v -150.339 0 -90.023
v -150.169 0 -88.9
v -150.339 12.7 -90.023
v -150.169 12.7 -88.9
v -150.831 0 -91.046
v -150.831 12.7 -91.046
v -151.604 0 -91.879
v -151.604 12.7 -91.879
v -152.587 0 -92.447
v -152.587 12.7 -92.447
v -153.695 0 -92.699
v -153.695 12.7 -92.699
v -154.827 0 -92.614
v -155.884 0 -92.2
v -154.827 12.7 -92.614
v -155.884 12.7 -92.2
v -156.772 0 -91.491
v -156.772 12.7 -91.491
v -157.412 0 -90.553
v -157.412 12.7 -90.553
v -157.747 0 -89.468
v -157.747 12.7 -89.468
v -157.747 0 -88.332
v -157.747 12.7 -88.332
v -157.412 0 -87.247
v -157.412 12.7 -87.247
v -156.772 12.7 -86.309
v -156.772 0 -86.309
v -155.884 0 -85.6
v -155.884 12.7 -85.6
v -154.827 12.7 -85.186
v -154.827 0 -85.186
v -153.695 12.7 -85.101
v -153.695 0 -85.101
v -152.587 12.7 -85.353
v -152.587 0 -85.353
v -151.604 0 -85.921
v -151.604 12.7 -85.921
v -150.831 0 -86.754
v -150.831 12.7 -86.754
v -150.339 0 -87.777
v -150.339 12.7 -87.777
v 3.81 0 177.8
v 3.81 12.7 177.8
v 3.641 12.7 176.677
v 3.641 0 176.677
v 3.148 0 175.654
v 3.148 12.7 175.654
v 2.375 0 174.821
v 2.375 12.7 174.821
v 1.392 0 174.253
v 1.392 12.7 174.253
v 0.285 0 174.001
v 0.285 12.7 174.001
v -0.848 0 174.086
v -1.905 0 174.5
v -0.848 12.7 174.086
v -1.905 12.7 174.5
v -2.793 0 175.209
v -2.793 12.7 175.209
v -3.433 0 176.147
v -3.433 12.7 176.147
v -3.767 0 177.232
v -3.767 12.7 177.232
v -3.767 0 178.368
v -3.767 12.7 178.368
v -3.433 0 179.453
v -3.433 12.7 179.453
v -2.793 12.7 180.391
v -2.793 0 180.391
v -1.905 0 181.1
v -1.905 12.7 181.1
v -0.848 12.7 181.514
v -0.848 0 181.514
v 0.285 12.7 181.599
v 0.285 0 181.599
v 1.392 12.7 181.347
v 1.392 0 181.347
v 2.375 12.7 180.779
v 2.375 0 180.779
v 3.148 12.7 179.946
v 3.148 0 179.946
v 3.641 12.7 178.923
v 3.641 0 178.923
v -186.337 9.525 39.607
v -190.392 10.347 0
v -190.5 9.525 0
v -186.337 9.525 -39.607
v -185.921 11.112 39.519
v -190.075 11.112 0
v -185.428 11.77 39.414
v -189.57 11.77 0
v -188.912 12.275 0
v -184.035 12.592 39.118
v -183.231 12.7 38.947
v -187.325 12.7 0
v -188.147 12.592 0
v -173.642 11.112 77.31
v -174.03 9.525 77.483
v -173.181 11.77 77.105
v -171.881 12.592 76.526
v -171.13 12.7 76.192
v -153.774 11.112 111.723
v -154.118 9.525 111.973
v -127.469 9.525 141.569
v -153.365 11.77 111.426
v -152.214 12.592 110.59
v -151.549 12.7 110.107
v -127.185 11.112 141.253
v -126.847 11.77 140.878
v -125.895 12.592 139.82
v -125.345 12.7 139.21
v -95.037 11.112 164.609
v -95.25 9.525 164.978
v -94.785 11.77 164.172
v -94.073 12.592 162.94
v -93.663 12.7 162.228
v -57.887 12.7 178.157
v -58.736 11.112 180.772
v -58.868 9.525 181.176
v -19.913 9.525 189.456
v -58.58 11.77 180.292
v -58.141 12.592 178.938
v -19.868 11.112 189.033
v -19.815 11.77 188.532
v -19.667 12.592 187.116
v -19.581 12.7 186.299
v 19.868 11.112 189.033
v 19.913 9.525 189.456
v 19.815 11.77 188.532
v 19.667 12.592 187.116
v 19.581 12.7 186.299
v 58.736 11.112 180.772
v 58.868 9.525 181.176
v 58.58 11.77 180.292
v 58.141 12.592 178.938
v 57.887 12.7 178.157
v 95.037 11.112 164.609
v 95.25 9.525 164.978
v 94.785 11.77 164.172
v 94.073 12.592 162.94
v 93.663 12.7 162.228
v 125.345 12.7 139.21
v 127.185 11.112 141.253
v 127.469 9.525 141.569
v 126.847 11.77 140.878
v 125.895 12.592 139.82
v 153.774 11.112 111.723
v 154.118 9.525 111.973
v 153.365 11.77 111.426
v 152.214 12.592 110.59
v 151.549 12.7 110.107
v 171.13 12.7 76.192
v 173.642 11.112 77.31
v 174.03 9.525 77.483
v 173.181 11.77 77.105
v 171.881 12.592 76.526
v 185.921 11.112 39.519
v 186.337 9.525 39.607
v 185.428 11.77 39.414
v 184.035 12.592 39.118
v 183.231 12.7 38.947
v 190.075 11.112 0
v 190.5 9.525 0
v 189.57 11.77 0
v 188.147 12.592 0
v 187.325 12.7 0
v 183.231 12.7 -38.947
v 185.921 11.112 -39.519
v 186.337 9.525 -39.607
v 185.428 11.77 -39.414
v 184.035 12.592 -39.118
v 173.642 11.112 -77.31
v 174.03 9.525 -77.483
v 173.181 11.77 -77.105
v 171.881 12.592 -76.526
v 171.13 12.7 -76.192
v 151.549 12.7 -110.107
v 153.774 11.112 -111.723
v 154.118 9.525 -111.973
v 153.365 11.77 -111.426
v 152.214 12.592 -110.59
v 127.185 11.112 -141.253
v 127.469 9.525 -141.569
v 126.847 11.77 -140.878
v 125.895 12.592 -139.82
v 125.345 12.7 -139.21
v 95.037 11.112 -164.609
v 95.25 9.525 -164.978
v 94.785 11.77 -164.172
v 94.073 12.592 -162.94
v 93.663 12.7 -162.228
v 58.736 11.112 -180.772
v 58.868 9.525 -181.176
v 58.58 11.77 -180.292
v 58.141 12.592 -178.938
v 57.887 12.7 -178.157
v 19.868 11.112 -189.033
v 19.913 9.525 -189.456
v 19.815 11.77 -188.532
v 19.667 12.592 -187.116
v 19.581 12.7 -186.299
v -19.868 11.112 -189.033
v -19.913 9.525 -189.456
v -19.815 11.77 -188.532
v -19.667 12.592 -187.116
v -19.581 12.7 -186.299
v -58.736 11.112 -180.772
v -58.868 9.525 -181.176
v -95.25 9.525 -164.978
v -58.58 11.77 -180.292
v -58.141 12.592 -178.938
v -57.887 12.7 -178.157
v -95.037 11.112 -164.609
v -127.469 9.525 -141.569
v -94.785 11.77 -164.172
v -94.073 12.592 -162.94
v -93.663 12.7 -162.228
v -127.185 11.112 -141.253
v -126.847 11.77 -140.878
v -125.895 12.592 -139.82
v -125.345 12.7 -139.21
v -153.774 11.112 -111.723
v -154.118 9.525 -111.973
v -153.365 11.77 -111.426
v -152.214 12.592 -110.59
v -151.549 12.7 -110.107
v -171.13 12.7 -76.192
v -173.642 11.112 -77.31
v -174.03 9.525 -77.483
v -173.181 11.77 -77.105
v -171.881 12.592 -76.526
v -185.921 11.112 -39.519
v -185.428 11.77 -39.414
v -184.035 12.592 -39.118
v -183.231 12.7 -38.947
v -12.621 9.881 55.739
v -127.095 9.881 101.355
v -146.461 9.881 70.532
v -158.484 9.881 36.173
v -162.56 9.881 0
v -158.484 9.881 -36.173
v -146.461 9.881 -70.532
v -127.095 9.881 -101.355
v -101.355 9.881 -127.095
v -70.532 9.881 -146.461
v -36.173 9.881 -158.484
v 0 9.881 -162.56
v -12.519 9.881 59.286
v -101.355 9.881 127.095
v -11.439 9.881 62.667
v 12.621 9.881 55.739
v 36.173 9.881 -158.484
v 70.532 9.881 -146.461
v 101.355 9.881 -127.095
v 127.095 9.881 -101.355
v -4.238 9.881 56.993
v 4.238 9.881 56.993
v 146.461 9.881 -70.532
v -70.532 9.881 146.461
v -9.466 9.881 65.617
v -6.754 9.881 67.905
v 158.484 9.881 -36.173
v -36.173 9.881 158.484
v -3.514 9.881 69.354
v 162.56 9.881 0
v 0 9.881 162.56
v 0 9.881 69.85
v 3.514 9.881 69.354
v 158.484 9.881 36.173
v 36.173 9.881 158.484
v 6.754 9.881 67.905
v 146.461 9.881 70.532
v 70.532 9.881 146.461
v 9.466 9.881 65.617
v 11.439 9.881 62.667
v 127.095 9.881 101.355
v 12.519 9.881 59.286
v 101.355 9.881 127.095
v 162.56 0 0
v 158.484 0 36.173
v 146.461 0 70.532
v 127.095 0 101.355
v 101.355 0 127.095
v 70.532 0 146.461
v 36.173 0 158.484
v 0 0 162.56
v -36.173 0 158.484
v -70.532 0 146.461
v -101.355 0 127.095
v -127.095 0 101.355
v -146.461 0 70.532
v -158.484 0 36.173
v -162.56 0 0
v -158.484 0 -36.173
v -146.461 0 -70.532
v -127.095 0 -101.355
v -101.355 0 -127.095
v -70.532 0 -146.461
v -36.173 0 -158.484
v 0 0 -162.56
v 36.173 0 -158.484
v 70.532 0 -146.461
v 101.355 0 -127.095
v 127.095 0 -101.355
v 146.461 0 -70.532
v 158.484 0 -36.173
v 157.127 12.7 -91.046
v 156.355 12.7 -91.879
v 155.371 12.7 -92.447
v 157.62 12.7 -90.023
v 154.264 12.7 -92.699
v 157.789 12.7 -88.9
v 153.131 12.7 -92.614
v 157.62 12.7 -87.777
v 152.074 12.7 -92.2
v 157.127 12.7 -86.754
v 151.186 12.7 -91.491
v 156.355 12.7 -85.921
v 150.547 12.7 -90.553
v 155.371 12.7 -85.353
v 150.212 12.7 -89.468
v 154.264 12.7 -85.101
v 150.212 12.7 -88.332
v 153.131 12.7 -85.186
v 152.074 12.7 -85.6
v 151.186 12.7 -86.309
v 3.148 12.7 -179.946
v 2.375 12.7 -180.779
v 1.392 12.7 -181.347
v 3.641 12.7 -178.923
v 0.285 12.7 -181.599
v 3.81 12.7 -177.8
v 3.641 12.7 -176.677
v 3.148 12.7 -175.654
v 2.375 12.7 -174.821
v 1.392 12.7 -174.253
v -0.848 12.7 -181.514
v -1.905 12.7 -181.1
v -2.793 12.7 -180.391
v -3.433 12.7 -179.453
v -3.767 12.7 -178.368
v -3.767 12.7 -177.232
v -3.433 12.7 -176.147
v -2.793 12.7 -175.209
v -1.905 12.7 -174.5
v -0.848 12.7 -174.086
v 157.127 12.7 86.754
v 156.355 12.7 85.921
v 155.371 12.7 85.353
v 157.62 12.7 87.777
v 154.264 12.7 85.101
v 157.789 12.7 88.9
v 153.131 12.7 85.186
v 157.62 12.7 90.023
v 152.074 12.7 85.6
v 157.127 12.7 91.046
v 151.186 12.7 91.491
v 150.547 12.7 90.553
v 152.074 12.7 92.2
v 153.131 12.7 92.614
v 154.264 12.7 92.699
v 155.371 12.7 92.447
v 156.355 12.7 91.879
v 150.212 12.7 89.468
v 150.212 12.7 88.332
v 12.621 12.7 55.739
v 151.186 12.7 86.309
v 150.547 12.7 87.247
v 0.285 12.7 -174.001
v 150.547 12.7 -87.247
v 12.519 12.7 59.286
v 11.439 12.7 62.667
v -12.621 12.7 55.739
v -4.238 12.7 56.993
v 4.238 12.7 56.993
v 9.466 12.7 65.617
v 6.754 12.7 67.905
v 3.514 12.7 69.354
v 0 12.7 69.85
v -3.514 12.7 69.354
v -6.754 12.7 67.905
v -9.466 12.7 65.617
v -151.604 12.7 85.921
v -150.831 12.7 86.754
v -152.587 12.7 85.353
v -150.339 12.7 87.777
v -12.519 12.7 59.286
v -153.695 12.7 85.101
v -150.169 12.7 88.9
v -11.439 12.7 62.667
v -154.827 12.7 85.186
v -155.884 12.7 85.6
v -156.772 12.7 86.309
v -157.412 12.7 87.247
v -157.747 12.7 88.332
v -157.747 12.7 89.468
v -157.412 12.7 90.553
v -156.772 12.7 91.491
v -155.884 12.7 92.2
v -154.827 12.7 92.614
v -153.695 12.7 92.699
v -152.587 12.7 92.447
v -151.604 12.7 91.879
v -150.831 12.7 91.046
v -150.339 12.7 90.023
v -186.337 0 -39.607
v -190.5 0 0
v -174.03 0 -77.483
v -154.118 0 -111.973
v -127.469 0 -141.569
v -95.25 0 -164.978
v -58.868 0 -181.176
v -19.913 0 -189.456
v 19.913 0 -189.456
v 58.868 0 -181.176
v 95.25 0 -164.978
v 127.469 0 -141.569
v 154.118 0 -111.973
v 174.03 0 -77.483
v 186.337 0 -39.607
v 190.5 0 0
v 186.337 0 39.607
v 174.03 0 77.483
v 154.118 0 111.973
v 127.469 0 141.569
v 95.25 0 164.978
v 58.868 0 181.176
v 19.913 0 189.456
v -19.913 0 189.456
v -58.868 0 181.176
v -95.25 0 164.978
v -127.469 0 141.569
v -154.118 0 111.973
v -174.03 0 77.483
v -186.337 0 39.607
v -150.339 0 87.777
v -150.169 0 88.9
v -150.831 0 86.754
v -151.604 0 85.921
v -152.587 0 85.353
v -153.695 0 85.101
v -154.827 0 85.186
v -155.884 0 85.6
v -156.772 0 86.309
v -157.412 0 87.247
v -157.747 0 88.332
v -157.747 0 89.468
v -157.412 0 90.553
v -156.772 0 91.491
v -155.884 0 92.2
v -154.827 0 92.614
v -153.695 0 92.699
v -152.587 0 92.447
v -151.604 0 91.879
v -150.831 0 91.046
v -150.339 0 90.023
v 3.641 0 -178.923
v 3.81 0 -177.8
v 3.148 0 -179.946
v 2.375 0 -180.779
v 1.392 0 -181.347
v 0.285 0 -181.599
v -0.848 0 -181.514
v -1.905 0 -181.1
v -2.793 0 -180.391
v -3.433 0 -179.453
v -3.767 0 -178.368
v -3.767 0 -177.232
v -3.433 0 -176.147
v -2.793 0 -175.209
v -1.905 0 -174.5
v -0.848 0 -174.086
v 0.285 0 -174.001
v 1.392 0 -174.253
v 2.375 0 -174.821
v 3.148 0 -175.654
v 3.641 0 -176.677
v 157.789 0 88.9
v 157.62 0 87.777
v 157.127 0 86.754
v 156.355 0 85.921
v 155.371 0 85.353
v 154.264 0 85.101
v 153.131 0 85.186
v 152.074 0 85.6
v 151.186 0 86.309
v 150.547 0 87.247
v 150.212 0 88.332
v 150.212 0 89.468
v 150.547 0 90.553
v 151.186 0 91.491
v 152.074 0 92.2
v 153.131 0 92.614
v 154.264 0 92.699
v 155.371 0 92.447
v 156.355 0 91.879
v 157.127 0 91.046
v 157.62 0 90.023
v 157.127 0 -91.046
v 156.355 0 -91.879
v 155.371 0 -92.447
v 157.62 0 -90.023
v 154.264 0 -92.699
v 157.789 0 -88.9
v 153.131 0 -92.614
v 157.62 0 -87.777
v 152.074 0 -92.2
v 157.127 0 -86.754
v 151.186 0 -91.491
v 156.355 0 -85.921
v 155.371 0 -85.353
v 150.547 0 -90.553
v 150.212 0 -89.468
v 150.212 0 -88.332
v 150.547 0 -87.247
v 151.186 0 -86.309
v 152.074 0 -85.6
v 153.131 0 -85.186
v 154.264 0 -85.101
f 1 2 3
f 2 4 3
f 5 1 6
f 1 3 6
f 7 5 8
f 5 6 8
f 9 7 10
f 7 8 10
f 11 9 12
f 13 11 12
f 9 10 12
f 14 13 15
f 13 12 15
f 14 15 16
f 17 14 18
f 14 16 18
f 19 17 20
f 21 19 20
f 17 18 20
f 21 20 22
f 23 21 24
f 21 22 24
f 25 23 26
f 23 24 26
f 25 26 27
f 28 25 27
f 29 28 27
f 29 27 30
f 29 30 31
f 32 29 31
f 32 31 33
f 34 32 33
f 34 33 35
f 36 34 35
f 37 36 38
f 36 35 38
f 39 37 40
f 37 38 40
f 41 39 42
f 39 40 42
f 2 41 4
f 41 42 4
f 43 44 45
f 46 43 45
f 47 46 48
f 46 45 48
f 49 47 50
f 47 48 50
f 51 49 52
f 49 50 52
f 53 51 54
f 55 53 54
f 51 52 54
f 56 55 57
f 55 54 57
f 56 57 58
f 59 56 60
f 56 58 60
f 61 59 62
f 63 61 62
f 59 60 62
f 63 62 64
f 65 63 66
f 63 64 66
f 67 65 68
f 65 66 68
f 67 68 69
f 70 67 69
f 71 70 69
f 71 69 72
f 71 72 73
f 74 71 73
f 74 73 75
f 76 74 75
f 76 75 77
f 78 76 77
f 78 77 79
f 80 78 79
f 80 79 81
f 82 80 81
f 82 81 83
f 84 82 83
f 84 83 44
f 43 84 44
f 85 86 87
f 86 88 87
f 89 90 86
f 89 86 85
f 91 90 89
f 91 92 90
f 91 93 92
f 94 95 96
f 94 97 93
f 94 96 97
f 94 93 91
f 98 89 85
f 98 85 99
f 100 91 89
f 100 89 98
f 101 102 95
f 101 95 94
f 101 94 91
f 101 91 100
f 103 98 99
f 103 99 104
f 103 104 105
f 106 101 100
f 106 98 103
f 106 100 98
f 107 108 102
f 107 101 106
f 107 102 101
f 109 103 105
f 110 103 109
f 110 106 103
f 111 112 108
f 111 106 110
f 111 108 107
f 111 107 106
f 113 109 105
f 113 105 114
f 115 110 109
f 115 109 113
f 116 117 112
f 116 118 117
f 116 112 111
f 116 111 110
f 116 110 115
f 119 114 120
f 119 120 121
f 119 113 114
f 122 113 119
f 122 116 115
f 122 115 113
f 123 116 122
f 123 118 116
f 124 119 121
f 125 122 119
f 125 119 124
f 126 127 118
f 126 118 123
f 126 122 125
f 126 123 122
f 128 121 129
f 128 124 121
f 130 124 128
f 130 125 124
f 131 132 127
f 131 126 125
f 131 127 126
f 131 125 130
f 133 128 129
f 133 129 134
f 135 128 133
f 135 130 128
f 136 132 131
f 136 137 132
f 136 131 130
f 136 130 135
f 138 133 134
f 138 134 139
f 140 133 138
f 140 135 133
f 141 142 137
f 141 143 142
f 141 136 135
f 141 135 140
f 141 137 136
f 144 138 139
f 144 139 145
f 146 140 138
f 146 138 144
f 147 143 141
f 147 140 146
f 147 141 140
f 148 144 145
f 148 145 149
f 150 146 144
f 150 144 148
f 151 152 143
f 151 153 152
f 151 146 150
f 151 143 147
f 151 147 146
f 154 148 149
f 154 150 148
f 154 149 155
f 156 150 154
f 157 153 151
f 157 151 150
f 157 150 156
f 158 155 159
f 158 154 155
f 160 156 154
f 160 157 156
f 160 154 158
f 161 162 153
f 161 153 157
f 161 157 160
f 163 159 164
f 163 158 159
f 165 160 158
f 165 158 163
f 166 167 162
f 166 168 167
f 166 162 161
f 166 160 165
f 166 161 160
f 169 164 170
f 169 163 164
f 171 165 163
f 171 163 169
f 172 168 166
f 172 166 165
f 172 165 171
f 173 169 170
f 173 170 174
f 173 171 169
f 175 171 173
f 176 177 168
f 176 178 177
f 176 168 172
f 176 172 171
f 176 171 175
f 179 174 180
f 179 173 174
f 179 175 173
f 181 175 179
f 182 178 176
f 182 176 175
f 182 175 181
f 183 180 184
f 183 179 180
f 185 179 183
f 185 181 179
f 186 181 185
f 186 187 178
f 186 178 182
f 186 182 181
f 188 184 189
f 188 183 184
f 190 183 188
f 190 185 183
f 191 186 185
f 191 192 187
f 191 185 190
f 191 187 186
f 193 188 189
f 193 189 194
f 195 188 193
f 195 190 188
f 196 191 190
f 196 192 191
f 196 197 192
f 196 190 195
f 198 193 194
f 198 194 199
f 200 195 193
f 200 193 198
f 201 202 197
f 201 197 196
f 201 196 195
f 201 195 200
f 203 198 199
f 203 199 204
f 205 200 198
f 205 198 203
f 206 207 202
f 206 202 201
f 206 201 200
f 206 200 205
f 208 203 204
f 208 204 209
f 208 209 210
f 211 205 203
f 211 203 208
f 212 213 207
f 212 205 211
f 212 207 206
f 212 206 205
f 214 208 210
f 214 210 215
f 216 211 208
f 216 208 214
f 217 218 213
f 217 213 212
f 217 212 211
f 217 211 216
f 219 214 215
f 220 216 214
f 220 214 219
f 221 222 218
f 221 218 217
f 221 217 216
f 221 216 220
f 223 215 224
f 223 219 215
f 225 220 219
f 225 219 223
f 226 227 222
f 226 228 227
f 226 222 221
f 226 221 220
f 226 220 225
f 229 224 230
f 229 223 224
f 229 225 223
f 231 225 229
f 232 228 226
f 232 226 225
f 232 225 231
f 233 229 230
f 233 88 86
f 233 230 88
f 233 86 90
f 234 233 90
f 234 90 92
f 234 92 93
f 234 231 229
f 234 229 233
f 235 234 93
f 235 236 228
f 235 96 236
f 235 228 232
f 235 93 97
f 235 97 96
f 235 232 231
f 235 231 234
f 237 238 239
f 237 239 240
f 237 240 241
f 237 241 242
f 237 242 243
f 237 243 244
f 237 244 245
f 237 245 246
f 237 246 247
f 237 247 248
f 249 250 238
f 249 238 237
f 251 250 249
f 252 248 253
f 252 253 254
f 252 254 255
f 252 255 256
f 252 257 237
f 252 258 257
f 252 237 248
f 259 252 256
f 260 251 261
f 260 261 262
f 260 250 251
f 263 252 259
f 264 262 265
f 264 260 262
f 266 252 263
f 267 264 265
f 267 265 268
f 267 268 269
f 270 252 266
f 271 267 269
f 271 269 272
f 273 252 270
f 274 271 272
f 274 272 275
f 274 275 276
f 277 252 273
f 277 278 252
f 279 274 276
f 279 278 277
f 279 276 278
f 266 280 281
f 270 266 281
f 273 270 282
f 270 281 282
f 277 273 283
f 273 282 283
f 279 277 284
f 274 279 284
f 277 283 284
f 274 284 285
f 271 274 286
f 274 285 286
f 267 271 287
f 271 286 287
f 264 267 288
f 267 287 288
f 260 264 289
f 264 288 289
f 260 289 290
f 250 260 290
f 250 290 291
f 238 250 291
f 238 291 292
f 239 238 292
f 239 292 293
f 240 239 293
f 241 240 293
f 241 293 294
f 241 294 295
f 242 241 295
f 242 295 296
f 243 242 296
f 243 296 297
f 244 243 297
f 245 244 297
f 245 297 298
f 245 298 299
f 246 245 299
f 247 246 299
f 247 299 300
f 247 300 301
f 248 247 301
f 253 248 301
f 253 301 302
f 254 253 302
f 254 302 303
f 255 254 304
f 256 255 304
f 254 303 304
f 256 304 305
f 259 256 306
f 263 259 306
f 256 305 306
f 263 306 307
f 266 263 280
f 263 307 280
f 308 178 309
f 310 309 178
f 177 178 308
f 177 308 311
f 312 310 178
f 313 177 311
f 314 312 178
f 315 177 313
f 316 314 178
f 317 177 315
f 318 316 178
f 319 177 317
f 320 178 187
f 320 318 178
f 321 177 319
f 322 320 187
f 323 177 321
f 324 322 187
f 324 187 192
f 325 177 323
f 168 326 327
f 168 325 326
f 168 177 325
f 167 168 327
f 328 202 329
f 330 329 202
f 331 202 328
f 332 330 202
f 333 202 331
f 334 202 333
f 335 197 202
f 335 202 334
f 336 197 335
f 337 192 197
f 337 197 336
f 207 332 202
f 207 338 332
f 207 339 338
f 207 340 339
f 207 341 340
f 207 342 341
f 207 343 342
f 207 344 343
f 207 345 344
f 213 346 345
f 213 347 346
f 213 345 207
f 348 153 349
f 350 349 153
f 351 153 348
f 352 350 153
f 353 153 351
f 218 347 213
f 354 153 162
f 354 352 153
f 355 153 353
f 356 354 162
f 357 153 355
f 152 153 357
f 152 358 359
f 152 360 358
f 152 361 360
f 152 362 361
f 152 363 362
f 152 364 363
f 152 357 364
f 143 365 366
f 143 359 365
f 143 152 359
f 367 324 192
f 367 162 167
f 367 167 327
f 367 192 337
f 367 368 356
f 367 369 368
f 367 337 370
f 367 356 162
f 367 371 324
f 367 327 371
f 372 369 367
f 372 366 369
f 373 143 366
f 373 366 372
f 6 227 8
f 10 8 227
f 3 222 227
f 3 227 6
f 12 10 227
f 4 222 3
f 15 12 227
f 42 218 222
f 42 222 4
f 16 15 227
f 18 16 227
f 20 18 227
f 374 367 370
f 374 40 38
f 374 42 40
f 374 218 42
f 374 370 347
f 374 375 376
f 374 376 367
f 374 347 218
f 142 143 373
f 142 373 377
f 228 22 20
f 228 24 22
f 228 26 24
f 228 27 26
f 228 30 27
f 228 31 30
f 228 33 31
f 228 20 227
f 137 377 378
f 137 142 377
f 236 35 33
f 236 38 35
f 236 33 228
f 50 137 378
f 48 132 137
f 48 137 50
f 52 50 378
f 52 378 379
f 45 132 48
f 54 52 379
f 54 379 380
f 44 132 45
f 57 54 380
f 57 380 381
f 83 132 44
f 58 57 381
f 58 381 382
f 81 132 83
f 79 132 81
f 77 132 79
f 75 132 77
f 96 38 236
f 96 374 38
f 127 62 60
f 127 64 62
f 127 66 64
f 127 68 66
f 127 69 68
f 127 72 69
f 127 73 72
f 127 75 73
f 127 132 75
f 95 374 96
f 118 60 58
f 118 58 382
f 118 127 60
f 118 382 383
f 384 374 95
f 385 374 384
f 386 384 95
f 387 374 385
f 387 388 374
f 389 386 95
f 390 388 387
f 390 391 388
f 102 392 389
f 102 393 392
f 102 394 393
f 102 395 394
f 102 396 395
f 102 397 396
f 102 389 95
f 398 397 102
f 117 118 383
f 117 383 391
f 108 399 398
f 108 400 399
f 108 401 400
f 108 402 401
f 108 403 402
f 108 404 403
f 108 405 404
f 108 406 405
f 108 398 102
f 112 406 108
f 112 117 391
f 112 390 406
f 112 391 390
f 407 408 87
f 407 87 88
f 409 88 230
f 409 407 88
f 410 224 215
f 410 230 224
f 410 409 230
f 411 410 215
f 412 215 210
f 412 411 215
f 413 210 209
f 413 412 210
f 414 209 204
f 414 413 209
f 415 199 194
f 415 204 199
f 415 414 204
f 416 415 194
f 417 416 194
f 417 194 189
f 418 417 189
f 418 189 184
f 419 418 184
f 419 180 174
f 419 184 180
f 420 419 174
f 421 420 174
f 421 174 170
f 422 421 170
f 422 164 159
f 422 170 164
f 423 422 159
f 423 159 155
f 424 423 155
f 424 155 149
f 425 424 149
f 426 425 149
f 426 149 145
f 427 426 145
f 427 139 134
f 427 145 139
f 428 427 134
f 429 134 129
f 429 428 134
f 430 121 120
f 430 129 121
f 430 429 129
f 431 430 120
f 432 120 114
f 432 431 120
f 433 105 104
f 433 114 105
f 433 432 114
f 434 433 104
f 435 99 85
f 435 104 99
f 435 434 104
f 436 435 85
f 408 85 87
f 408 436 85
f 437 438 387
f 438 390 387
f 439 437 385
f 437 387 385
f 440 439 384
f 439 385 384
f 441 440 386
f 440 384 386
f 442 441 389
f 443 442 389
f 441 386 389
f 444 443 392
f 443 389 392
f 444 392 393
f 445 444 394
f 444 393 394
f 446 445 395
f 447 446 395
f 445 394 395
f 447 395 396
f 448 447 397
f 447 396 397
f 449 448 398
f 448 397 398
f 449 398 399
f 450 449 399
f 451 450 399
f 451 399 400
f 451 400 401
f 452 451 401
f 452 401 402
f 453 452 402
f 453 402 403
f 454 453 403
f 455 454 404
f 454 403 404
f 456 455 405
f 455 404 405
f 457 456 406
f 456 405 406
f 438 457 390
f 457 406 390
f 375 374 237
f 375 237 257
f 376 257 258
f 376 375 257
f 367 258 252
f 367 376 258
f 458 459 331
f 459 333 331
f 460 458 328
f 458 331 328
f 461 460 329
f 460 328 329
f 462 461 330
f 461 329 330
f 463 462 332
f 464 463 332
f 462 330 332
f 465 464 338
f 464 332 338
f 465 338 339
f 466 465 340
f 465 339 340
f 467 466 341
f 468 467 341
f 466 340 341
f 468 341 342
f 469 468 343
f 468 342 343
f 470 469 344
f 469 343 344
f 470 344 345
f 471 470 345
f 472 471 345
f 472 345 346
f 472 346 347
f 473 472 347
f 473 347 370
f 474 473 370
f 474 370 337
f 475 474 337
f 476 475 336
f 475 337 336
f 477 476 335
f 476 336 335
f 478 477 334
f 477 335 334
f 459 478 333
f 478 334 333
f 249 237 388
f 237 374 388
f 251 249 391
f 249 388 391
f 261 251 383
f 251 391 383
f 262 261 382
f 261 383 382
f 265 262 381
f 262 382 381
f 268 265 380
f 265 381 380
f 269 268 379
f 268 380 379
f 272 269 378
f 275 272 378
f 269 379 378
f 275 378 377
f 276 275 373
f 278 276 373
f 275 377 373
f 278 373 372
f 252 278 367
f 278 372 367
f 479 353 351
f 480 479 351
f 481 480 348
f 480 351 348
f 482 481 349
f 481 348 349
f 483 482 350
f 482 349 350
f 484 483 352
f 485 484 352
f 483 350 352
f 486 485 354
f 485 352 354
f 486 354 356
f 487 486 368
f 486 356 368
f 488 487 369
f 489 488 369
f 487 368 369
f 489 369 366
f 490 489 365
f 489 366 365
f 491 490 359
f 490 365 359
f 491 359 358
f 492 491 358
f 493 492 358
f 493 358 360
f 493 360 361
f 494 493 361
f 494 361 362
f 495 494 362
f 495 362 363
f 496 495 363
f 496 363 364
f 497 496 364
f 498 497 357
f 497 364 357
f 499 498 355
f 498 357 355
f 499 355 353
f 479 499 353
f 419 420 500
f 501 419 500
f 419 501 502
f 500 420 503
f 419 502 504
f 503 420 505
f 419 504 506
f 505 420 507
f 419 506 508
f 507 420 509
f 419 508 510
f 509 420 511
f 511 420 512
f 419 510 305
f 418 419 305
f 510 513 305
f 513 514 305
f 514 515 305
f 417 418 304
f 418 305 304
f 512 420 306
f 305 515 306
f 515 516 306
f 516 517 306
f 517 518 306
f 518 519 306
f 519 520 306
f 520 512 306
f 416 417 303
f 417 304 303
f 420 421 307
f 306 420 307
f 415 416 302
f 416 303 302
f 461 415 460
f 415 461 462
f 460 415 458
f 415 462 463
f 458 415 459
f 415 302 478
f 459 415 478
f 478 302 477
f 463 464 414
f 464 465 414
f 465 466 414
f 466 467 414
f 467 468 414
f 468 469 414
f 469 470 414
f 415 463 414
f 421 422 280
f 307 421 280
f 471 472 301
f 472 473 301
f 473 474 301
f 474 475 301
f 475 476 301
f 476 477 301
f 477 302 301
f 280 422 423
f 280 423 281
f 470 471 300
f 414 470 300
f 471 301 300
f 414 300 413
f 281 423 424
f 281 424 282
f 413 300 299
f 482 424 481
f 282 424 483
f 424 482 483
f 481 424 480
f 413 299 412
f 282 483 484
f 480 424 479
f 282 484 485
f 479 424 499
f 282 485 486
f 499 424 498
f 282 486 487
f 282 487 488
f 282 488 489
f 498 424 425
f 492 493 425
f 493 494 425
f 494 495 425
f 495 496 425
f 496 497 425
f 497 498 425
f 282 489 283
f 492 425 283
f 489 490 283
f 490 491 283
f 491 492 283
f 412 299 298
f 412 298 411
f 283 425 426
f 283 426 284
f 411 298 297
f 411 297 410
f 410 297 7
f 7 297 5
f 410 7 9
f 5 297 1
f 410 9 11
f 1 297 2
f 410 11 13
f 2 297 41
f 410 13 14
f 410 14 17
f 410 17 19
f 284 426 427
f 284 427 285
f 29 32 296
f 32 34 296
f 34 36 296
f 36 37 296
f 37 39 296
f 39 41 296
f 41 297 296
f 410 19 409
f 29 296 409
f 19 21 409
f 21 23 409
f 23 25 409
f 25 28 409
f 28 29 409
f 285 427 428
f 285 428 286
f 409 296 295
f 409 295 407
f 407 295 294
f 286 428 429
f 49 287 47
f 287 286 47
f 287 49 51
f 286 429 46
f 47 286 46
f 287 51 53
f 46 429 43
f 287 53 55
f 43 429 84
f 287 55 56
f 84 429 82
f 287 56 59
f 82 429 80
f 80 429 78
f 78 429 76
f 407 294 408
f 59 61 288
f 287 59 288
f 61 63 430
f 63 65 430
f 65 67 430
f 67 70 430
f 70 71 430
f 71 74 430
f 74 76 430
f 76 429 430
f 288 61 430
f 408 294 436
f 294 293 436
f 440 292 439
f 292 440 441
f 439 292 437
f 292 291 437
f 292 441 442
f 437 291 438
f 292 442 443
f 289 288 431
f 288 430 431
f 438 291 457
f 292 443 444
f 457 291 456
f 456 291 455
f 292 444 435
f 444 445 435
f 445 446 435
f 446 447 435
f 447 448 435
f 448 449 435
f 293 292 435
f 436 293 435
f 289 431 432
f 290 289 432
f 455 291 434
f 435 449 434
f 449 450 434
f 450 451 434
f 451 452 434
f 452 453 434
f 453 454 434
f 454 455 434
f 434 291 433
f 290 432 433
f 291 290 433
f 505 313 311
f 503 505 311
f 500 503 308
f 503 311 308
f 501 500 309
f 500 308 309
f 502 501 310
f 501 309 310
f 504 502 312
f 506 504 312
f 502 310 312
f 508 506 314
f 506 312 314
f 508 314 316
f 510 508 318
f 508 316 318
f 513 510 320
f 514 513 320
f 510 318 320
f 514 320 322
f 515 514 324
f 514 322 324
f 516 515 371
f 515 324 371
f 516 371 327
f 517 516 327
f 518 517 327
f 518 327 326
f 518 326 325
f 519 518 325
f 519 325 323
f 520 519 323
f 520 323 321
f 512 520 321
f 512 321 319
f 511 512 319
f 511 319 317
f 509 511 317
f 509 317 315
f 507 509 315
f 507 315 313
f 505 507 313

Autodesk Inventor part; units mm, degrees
ref_plane "YZ Plane" through (0, 0, 0) normal (1, 0, 0) x (0, 1, 0)
ref_plane "XZ Plane" through (0, 0, 0) normal (0, 1, 0) x (-1, 0, 0)
ref_plane "XY Plane" through (0, 0, 0) normal (0, 0, 1) x (1, 0, 0)
sketch "Sketch1" plane through (0, 0, 0) normal (0, 1, 0) x (-1, 0, 0)
  circle A0 centre (0, 0) radius 190.5
  dimension "d1" = 381
ref_plane "Work Plane1" through (0, 12.7, 0) normal (0, 1, 0) x (1, 0, 0)
sketch "Sketch2" plane through (0, 12.7, 0) normal (0, 1, 0) x (1, 0, 0)
  line L0 (0, 0) -> (0, -177.8) construction
  line L1 (0, 0) -> (177.8, 0) construction
  circle A0 centre (0, -177.8) radius 3.81
  circle A1 centre (153.9793, -88.9) radius 3.81
  circle A2 centre (153.9793, 88.9) radius 3.81
  circle A3 centre (0, 177.8) radius 3.81
  circle A4 centre (-153.9793, 88.9) radius 3.81
  circle A5 centre (-153.9793, -88.9) radius 3.81
  dimension "d6" = 177.8
  dimension "d7" = 90
  dimension "d8" = 7.62
  dimension "d9" = 360
extrude "Extrusion3" add sketch "Sketch1" along normal blind 12.7
extrude "Extrusion4" cut sketch "Sketch2" against normal through all
sketch "Sketch3" plane through (0, 0, 0) normal (0, -1, 0) x (1, 0, 0)
  circle A0 centre (0, 0) radius 162.56
  dimension "d16" = 325.12
extrude "Extrusion5" cut sketch "Sketch3" against normal blind 9.8806
fillet "Fillet1" radius 3.175 1 edges at (190.5, 12.7, 0)
sketch "Sketch4" plane through (0, 12.7, 0) normal (0, 1, 0) x (1, 0, 0)
  arc A0 (-12.6214, -55.7389) -> (12.6214, -55.7389) centre (0, 0) ccw
  arc A1 (-12.6214, -55.7389) -> (12.6214, -55.7389) centre (0, -57.15) ccw
  dimension "d20" = 114.3
  dimension "d21" = 25.4
extrude "Extrusion6" cut sketch "Sketch4" against normal blind 9.8806
properties part number "Turntable Cap" material "PVC-Piping"
